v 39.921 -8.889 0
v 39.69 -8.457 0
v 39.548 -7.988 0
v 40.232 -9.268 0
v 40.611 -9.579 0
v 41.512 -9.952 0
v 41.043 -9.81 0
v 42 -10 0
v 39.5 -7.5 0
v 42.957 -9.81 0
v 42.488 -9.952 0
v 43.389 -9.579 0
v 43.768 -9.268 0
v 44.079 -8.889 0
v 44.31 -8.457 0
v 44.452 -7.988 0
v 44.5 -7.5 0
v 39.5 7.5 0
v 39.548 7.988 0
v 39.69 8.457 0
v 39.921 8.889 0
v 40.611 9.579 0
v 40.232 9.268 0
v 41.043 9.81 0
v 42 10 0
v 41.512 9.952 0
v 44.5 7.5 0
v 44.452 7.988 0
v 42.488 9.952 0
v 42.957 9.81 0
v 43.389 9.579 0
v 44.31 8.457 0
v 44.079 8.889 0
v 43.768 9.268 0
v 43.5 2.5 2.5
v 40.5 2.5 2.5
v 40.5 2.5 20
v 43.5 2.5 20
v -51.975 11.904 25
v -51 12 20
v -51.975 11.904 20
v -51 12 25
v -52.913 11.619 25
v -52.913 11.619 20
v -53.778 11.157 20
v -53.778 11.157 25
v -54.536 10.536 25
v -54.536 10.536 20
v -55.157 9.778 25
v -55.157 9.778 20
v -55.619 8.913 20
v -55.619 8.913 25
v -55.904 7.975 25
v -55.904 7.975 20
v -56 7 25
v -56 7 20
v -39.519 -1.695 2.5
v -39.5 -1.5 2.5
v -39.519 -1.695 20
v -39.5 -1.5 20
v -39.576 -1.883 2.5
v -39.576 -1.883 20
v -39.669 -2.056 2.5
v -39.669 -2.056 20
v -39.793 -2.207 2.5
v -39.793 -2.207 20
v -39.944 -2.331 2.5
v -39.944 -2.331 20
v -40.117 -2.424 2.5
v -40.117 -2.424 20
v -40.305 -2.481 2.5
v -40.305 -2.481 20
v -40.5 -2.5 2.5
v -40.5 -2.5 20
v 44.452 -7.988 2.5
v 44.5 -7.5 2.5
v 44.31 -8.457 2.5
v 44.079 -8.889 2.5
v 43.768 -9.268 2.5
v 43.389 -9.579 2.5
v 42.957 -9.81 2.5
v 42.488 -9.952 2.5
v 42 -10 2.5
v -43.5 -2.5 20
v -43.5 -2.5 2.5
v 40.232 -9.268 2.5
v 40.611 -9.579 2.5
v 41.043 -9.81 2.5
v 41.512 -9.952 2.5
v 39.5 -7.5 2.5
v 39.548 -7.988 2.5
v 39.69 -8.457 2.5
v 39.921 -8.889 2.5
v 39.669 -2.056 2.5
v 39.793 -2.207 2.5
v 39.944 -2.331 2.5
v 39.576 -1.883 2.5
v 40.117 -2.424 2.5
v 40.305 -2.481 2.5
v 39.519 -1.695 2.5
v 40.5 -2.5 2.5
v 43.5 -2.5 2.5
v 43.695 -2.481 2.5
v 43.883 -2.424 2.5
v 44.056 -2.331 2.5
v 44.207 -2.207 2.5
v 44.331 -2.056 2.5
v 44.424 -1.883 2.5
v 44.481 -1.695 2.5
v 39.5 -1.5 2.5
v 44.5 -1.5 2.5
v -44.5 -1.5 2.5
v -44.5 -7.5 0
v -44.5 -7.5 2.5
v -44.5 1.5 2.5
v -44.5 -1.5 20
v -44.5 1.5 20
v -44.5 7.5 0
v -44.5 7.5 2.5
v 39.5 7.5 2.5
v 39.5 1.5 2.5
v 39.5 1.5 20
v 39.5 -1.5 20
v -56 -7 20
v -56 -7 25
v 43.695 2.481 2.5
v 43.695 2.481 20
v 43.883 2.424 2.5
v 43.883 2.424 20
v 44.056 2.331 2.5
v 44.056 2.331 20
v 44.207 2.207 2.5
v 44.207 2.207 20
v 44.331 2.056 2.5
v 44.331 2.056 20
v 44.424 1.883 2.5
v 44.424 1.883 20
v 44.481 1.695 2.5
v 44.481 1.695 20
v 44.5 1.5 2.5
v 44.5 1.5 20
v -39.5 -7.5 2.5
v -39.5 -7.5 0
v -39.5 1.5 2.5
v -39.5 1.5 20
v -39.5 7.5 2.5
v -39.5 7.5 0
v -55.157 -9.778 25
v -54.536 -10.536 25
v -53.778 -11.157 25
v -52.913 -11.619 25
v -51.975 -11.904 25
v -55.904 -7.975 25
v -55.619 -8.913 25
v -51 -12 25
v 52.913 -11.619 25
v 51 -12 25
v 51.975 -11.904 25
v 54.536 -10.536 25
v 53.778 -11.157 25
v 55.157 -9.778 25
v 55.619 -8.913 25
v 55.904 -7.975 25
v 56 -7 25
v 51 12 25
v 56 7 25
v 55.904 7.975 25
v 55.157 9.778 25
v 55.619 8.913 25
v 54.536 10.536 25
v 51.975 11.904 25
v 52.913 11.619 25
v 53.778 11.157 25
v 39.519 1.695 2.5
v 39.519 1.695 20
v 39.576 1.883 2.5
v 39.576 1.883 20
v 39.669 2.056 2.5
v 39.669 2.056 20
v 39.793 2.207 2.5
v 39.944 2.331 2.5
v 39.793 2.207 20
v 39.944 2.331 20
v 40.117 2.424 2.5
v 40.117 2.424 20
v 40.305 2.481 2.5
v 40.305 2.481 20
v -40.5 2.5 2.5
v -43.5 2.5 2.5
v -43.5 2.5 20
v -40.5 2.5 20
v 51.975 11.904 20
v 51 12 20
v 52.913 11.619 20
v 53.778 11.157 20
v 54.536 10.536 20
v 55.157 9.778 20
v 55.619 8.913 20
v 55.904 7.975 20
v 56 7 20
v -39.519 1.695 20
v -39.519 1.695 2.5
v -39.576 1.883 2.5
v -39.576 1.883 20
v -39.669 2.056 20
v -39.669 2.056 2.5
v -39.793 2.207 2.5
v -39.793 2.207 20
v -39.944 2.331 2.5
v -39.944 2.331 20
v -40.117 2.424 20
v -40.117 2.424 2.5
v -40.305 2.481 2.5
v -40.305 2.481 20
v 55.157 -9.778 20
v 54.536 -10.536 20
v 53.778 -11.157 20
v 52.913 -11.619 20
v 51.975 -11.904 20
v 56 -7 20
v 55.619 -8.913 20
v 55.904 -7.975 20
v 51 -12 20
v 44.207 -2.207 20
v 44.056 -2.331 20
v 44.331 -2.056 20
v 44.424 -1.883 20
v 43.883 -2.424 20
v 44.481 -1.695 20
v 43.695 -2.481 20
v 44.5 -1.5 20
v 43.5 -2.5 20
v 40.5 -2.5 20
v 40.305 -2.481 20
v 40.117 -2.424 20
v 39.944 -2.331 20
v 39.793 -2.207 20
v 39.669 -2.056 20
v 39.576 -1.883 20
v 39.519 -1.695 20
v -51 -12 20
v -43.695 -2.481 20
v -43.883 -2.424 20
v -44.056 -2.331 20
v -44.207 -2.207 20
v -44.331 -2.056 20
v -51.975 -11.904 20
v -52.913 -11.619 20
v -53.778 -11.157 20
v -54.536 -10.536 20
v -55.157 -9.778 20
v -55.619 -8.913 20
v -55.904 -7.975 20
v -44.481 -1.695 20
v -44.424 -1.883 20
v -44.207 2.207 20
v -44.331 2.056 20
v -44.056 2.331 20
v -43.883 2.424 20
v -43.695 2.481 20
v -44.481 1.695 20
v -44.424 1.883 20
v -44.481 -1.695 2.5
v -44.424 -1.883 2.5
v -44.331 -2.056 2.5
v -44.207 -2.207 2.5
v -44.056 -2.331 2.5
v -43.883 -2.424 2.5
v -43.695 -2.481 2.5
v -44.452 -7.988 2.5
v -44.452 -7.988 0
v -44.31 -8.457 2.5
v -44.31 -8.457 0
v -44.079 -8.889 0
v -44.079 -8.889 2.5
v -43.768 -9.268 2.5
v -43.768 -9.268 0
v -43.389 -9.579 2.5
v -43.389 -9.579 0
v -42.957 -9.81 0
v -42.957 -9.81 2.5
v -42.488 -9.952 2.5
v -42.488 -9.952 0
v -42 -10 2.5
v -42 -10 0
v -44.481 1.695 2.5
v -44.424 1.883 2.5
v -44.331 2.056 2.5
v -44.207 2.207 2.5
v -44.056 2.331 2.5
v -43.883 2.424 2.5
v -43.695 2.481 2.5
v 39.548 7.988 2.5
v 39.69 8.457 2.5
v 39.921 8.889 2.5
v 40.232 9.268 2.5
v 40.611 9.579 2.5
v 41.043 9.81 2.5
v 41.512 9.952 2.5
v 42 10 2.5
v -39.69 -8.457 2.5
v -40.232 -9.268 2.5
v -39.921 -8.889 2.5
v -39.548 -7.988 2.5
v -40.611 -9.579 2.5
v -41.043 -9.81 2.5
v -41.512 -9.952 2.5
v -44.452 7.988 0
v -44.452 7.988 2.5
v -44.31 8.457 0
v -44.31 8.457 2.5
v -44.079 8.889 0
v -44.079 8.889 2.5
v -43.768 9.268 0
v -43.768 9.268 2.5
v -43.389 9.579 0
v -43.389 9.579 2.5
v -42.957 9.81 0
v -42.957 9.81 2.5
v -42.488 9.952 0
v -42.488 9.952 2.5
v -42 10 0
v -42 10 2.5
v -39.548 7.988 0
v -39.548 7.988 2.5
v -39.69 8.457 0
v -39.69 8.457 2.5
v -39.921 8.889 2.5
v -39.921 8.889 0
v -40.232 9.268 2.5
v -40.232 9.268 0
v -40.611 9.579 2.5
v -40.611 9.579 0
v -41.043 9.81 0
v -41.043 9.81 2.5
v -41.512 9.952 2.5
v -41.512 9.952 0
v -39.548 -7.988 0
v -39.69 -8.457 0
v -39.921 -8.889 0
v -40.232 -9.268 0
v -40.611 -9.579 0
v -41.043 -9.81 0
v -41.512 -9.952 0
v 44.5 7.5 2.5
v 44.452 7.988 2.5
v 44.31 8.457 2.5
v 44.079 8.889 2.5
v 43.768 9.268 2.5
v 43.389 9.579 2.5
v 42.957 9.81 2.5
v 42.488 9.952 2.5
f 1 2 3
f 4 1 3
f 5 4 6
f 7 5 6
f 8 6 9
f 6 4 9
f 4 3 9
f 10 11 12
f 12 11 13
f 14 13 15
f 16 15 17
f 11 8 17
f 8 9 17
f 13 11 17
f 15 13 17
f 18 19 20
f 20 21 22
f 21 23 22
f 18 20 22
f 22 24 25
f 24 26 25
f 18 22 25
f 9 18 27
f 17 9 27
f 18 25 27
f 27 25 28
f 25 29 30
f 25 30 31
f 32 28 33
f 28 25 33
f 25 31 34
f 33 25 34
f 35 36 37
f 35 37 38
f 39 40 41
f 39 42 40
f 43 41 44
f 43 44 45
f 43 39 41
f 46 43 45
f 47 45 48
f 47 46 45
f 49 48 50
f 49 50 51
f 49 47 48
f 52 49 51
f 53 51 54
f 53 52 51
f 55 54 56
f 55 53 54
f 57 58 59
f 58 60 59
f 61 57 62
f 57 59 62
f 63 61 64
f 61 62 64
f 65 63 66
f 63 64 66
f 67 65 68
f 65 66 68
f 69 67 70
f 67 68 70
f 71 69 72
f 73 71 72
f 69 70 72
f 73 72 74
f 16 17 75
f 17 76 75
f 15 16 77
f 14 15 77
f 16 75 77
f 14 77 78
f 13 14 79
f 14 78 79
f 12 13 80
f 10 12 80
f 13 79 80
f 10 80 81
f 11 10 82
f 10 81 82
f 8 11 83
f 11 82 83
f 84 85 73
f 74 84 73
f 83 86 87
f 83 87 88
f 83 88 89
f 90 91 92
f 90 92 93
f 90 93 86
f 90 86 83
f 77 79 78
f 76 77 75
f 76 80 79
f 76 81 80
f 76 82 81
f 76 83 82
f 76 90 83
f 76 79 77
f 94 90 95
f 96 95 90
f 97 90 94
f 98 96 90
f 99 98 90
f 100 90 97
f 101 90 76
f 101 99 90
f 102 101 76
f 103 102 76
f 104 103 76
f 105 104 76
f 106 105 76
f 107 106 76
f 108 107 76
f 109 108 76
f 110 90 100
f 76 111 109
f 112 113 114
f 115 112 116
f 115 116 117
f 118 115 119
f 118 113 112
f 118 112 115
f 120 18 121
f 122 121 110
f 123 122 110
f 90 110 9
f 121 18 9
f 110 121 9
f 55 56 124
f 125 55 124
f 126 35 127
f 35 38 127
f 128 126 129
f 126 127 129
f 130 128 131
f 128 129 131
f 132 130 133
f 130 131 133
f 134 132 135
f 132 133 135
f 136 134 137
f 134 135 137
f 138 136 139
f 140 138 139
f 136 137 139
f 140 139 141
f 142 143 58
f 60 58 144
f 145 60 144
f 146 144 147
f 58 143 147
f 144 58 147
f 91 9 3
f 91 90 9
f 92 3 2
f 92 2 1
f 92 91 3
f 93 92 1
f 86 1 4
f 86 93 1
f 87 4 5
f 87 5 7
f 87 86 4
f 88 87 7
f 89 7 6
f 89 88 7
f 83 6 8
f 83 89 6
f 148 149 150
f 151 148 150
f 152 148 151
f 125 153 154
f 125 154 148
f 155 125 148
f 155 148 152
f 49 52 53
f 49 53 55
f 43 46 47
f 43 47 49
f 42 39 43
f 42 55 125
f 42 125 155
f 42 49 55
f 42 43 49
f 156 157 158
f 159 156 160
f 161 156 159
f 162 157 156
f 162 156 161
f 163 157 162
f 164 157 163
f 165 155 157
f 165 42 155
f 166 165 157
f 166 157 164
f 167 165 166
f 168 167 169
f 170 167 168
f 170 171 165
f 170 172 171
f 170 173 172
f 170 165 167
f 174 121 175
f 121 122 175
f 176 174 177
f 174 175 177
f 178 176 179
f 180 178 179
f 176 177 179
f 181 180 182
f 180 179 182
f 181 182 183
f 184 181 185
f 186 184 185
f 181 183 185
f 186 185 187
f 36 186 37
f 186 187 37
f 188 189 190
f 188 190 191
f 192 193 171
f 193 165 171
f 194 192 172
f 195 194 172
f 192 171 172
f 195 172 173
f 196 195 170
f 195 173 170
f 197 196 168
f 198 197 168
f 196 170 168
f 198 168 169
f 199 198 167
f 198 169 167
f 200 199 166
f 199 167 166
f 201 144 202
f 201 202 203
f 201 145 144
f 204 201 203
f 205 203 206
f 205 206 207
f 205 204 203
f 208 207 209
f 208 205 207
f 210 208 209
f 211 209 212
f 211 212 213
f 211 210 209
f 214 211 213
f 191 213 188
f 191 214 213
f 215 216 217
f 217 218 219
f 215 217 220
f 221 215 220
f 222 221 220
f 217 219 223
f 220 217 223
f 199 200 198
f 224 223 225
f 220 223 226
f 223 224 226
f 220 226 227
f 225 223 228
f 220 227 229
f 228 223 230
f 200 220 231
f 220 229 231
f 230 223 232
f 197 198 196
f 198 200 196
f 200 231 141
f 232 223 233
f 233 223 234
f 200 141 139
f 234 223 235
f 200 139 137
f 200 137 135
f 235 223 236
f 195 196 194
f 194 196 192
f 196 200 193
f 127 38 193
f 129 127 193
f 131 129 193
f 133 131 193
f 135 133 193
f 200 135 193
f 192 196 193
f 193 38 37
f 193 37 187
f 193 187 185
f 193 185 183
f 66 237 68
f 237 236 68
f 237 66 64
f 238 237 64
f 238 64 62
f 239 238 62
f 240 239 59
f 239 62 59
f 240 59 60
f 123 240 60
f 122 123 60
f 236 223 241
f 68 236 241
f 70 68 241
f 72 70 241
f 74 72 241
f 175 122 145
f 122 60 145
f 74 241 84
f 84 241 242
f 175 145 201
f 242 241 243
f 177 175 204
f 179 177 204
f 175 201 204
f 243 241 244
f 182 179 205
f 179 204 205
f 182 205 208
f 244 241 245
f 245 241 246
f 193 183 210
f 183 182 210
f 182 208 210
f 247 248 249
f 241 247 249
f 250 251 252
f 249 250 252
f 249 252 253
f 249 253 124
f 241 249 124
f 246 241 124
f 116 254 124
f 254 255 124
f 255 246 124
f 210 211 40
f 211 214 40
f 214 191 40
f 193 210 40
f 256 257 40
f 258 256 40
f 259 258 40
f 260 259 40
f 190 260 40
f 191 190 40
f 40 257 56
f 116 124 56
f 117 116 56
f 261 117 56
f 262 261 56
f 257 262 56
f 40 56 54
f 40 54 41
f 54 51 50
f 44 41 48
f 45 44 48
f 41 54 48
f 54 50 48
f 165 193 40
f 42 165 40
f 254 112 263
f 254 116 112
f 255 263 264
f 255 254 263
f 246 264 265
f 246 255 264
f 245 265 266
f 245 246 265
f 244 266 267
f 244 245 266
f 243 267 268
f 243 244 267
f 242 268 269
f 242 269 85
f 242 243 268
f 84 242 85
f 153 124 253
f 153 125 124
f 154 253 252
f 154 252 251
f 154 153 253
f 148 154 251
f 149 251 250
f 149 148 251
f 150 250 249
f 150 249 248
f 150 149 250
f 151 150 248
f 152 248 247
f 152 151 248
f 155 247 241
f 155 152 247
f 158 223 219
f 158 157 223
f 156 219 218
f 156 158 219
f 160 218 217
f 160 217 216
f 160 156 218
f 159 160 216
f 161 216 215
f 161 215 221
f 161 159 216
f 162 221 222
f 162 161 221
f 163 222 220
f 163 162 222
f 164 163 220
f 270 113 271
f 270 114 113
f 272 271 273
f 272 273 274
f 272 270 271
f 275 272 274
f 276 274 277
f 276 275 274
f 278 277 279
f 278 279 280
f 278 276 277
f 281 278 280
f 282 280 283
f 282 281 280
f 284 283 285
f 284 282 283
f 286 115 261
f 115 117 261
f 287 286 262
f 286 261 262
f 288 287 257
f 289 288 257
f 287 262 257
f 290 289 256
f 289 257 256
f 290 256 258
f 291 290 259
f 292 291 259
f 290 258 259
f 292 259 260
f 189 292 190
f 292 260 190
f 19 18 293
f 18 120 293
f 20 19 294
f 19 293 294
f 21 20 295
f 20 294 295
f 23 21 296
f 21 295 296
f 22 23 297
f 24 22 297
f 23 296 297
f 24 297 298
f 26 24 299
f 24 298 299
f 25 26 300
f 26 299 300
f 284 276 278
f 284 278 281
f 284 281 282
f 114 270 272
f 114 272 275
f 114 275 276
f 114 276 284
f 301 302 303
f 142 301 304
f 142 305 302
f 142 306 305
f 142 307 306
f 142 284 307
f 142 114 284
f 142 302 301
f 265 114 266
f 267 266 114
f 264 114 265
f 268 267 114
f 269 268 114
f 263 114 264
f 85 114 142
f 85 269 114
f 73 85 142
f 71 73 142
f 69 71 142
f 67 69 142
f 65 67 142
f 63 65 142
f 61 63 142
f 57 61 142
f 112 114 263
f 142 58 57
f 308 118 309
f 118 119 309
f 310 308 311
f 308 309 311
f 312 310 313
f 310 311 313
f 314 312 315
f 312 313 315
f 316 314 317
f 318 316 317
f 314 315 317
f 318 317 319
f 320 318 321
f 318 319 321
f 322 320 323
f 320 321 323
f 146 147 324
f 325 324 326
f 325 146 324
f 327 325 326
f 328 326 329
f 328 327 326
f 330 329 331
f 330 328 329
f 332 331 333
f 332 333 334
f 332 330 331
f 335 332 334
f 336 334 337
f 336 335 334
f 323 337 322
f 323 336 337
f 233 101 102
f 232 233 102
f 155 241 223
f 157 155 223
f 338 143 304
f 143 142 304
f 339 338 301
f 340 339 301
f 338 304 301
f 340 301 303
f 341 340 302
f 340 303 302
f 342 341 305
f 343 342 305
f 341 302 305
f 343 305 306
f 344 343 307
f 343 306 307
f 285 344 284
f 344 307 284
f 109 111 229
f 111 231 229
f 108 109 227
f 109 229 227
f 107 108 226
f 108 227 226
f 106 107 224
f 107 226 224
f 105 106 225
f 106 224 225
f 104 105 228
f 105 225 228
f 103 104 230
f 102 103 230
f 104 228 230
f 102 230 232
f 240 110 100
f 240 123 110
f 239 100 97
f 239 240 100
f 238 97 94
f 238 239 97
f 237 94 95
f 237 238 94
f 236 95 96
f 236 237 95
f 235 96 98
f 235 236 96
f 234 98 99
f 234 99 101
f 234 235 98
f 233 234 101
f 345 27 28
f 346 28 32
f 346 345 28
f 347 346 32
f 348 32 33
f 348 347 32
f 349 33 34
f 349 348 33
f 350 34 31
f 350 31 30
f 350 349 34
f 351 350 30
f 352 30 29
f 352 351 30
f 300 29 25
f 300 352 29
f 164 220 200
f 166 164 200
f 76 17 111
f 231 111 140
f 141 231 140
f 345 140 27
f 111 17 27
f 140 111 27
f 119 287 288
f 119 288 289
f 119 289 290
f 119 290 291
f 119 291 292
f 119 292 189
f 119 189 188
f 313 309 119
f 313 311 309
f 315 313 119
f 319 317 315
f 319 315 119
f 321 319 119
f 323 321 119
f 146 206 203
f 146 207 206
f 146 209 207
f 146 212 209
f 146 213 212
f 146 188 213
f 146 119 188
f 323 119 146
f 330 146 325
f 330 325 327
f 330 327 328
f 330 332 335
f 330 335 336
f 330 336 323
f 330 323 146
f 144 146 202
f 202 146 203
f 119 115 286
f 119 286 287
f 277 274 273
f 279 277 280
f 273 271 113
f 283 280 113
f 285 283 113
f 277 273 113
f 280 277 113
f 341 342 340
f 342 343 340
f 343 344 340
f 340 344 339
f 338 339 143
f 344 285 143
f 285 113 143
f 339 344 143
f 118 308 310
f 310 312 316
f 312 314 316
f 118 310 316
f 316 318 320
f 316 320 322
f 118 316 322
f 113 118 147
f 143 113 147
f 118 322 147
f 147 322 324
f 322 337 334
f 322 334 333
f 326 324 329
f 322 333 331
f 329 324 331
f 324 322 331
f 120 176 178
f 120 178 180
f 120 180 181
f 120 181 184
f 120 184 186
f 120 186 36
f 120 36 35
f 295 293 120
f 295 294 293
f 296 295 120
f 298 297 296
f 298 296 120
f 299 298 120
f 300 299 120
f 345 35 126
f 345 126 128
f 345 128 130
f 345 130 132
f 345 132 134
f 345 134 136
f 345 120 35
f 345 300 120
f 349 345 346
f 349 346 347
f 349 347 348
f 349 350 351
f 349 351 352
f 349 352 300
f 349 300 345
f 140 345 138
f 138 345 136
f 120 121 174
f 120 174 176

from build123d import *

# Parameters (mm, degrees)
F1_START = 20
F1_DEPTH = 5
F2_DEPTH = 5
F3_R     = 5
F0_W     = 5
F0_H     = 2.5
F4_DEPTH = 25
F0_H_2   = 7.5
F5_DEPTH = 2.5
F6_R     = 1
F7_R     = 2.49999
F8_R     = 2.49999


# Not quite as in the source:
# - a fillet or chamfer is up to 0.001 mm smaller than in the source, because OpenCascade refuses the exact size


with BuildPart() as f1:
    # F0 (on Top) → F1 (new body)
    with BuildSketch(Plane.XY.offset(F1_START)):
        Polygon((56, 0), (56, 12), (-56, 12), (-56, 0), (-44.5, 0), (-44.5, 2.5), (-44.5, 10), (-39.5, 10), (-39.5, 2.5), (-39.5, 0), (-28, 0), (0, 0), (28, 0), (39.5, 0), (39.5, 2.5), (39.5, 10), (44.5, 10), (44.5, 2.5), (44.5, 0), align=None)
        Polygon((56, -12), (56, 0), (44.5, 0), (44.5, -2.5), (44.5, -10), (39.5, -10), (39.5, -2.5), (39.5, 0), (28, 0), (0, 0), (-28, 0), (-39.5, 0), (-39.5, -2.5), (-39.5, -10), (-44.5, -10), (-44.5, -2.5), (-44.5, 0), (-56, 0), (-56, -12), align=None)
    extrude(amount=F1_DEPTH)

    # F2 (add): faces of the model
    f2_faces = [f1.faces().sort_by_distance(p)[0] for p in [
        (39.5, 0, 22.5),
        (-44.5, 0, 22.5),
    ]]
    extrude(f2_faces, amount=F2_DEPTH)

    # F3
    f3_edges = [f1.edges().sort_by_distance(p)[0] for p in [
        (56, -12, 22.5),
        (56, 12, 22.5),
        (-56, -12, 22.5),
        (-56, 12, 22.5),
    ]]
    fillet(f3_edges, radius=F3_R)

    # F0 (on Top) → F4 (join)
    with BuildSketch(Plane.XY):
        with Locations((-42, -1.25)):
            Rectangle(F0_W, F0_H)
        with Locations((-42, 1.25)):
            Rectangle(F0_W, F0_H)
        with Locations((42, 1.25)):
            Rectangle(F0_W, F0_H)
        with Locations((42, -1.25)):
            Rectangle(F0_W, F0_H)
    extrude(amount=F4_DEPTH)

    # F0 (on Top) → F5 (join)
    with BuildSketch(Plane.XY):
        with Locations((-42, -6.25)):
            Rectangle(F0_W, F0_H_2)
        with Locations((-42, 6.25)):
            Rectangle(F0_W, F0_H_2)
        with Locations((42, 6.25)):
            Rectangle(F0_W, F0_H_2)
        with Locations((42, -6.25)):
            Rectangle(F0_W, F0_H_2)
    extrude(amount=F5_DEPTH)

    # F6
    f6_edges = [f1.edges().sort_by_distance(p)[0] for p in [
        (44.5, -2.5, 11.25),
        (39.5, -2.5, 11.25),
        (44.5, 2.5, 11.25),
        (39.5, 2.5, 11.25),
        (-39.5, 2.5, 11.25),
        (-44.5, 2.5, 11.25),
        (-44.5, -2.5, 11.25),
        (-39.5, -2.5, 11.25),
    ]]
    fillet(f6_edges, radius=F6_R)

    # F7 (radius 2.5 in the source; OpenCascade refuses exactly that, so slightly less here)
    f7_edges = [f1.edges().sort_by_distance(p)[0] for p in [
        (-39.5, -10, 1.25),
        (-44.5, -10, 1.25),
        (-39.5, 10, 1.25),
        (-44.5, 10, 1.25),
    ]]
    fillet(f7_edges, radius=F7_R)

    # F8 (radius 2.5 in the source; OpenCascade refuses exactly that, so slightly less here)
    f8_edges = [f1.edges().sort_by_distance(p)[0] for p in [
        (39.5, -10, 1.25),
        (44.5, -10, 1.25),
        (44.5, 10, 1.25),
        (39.5, 10, 1.25),
    ]]
    fillet(f8_edges, radius=F8_R)


solid = f1.part
